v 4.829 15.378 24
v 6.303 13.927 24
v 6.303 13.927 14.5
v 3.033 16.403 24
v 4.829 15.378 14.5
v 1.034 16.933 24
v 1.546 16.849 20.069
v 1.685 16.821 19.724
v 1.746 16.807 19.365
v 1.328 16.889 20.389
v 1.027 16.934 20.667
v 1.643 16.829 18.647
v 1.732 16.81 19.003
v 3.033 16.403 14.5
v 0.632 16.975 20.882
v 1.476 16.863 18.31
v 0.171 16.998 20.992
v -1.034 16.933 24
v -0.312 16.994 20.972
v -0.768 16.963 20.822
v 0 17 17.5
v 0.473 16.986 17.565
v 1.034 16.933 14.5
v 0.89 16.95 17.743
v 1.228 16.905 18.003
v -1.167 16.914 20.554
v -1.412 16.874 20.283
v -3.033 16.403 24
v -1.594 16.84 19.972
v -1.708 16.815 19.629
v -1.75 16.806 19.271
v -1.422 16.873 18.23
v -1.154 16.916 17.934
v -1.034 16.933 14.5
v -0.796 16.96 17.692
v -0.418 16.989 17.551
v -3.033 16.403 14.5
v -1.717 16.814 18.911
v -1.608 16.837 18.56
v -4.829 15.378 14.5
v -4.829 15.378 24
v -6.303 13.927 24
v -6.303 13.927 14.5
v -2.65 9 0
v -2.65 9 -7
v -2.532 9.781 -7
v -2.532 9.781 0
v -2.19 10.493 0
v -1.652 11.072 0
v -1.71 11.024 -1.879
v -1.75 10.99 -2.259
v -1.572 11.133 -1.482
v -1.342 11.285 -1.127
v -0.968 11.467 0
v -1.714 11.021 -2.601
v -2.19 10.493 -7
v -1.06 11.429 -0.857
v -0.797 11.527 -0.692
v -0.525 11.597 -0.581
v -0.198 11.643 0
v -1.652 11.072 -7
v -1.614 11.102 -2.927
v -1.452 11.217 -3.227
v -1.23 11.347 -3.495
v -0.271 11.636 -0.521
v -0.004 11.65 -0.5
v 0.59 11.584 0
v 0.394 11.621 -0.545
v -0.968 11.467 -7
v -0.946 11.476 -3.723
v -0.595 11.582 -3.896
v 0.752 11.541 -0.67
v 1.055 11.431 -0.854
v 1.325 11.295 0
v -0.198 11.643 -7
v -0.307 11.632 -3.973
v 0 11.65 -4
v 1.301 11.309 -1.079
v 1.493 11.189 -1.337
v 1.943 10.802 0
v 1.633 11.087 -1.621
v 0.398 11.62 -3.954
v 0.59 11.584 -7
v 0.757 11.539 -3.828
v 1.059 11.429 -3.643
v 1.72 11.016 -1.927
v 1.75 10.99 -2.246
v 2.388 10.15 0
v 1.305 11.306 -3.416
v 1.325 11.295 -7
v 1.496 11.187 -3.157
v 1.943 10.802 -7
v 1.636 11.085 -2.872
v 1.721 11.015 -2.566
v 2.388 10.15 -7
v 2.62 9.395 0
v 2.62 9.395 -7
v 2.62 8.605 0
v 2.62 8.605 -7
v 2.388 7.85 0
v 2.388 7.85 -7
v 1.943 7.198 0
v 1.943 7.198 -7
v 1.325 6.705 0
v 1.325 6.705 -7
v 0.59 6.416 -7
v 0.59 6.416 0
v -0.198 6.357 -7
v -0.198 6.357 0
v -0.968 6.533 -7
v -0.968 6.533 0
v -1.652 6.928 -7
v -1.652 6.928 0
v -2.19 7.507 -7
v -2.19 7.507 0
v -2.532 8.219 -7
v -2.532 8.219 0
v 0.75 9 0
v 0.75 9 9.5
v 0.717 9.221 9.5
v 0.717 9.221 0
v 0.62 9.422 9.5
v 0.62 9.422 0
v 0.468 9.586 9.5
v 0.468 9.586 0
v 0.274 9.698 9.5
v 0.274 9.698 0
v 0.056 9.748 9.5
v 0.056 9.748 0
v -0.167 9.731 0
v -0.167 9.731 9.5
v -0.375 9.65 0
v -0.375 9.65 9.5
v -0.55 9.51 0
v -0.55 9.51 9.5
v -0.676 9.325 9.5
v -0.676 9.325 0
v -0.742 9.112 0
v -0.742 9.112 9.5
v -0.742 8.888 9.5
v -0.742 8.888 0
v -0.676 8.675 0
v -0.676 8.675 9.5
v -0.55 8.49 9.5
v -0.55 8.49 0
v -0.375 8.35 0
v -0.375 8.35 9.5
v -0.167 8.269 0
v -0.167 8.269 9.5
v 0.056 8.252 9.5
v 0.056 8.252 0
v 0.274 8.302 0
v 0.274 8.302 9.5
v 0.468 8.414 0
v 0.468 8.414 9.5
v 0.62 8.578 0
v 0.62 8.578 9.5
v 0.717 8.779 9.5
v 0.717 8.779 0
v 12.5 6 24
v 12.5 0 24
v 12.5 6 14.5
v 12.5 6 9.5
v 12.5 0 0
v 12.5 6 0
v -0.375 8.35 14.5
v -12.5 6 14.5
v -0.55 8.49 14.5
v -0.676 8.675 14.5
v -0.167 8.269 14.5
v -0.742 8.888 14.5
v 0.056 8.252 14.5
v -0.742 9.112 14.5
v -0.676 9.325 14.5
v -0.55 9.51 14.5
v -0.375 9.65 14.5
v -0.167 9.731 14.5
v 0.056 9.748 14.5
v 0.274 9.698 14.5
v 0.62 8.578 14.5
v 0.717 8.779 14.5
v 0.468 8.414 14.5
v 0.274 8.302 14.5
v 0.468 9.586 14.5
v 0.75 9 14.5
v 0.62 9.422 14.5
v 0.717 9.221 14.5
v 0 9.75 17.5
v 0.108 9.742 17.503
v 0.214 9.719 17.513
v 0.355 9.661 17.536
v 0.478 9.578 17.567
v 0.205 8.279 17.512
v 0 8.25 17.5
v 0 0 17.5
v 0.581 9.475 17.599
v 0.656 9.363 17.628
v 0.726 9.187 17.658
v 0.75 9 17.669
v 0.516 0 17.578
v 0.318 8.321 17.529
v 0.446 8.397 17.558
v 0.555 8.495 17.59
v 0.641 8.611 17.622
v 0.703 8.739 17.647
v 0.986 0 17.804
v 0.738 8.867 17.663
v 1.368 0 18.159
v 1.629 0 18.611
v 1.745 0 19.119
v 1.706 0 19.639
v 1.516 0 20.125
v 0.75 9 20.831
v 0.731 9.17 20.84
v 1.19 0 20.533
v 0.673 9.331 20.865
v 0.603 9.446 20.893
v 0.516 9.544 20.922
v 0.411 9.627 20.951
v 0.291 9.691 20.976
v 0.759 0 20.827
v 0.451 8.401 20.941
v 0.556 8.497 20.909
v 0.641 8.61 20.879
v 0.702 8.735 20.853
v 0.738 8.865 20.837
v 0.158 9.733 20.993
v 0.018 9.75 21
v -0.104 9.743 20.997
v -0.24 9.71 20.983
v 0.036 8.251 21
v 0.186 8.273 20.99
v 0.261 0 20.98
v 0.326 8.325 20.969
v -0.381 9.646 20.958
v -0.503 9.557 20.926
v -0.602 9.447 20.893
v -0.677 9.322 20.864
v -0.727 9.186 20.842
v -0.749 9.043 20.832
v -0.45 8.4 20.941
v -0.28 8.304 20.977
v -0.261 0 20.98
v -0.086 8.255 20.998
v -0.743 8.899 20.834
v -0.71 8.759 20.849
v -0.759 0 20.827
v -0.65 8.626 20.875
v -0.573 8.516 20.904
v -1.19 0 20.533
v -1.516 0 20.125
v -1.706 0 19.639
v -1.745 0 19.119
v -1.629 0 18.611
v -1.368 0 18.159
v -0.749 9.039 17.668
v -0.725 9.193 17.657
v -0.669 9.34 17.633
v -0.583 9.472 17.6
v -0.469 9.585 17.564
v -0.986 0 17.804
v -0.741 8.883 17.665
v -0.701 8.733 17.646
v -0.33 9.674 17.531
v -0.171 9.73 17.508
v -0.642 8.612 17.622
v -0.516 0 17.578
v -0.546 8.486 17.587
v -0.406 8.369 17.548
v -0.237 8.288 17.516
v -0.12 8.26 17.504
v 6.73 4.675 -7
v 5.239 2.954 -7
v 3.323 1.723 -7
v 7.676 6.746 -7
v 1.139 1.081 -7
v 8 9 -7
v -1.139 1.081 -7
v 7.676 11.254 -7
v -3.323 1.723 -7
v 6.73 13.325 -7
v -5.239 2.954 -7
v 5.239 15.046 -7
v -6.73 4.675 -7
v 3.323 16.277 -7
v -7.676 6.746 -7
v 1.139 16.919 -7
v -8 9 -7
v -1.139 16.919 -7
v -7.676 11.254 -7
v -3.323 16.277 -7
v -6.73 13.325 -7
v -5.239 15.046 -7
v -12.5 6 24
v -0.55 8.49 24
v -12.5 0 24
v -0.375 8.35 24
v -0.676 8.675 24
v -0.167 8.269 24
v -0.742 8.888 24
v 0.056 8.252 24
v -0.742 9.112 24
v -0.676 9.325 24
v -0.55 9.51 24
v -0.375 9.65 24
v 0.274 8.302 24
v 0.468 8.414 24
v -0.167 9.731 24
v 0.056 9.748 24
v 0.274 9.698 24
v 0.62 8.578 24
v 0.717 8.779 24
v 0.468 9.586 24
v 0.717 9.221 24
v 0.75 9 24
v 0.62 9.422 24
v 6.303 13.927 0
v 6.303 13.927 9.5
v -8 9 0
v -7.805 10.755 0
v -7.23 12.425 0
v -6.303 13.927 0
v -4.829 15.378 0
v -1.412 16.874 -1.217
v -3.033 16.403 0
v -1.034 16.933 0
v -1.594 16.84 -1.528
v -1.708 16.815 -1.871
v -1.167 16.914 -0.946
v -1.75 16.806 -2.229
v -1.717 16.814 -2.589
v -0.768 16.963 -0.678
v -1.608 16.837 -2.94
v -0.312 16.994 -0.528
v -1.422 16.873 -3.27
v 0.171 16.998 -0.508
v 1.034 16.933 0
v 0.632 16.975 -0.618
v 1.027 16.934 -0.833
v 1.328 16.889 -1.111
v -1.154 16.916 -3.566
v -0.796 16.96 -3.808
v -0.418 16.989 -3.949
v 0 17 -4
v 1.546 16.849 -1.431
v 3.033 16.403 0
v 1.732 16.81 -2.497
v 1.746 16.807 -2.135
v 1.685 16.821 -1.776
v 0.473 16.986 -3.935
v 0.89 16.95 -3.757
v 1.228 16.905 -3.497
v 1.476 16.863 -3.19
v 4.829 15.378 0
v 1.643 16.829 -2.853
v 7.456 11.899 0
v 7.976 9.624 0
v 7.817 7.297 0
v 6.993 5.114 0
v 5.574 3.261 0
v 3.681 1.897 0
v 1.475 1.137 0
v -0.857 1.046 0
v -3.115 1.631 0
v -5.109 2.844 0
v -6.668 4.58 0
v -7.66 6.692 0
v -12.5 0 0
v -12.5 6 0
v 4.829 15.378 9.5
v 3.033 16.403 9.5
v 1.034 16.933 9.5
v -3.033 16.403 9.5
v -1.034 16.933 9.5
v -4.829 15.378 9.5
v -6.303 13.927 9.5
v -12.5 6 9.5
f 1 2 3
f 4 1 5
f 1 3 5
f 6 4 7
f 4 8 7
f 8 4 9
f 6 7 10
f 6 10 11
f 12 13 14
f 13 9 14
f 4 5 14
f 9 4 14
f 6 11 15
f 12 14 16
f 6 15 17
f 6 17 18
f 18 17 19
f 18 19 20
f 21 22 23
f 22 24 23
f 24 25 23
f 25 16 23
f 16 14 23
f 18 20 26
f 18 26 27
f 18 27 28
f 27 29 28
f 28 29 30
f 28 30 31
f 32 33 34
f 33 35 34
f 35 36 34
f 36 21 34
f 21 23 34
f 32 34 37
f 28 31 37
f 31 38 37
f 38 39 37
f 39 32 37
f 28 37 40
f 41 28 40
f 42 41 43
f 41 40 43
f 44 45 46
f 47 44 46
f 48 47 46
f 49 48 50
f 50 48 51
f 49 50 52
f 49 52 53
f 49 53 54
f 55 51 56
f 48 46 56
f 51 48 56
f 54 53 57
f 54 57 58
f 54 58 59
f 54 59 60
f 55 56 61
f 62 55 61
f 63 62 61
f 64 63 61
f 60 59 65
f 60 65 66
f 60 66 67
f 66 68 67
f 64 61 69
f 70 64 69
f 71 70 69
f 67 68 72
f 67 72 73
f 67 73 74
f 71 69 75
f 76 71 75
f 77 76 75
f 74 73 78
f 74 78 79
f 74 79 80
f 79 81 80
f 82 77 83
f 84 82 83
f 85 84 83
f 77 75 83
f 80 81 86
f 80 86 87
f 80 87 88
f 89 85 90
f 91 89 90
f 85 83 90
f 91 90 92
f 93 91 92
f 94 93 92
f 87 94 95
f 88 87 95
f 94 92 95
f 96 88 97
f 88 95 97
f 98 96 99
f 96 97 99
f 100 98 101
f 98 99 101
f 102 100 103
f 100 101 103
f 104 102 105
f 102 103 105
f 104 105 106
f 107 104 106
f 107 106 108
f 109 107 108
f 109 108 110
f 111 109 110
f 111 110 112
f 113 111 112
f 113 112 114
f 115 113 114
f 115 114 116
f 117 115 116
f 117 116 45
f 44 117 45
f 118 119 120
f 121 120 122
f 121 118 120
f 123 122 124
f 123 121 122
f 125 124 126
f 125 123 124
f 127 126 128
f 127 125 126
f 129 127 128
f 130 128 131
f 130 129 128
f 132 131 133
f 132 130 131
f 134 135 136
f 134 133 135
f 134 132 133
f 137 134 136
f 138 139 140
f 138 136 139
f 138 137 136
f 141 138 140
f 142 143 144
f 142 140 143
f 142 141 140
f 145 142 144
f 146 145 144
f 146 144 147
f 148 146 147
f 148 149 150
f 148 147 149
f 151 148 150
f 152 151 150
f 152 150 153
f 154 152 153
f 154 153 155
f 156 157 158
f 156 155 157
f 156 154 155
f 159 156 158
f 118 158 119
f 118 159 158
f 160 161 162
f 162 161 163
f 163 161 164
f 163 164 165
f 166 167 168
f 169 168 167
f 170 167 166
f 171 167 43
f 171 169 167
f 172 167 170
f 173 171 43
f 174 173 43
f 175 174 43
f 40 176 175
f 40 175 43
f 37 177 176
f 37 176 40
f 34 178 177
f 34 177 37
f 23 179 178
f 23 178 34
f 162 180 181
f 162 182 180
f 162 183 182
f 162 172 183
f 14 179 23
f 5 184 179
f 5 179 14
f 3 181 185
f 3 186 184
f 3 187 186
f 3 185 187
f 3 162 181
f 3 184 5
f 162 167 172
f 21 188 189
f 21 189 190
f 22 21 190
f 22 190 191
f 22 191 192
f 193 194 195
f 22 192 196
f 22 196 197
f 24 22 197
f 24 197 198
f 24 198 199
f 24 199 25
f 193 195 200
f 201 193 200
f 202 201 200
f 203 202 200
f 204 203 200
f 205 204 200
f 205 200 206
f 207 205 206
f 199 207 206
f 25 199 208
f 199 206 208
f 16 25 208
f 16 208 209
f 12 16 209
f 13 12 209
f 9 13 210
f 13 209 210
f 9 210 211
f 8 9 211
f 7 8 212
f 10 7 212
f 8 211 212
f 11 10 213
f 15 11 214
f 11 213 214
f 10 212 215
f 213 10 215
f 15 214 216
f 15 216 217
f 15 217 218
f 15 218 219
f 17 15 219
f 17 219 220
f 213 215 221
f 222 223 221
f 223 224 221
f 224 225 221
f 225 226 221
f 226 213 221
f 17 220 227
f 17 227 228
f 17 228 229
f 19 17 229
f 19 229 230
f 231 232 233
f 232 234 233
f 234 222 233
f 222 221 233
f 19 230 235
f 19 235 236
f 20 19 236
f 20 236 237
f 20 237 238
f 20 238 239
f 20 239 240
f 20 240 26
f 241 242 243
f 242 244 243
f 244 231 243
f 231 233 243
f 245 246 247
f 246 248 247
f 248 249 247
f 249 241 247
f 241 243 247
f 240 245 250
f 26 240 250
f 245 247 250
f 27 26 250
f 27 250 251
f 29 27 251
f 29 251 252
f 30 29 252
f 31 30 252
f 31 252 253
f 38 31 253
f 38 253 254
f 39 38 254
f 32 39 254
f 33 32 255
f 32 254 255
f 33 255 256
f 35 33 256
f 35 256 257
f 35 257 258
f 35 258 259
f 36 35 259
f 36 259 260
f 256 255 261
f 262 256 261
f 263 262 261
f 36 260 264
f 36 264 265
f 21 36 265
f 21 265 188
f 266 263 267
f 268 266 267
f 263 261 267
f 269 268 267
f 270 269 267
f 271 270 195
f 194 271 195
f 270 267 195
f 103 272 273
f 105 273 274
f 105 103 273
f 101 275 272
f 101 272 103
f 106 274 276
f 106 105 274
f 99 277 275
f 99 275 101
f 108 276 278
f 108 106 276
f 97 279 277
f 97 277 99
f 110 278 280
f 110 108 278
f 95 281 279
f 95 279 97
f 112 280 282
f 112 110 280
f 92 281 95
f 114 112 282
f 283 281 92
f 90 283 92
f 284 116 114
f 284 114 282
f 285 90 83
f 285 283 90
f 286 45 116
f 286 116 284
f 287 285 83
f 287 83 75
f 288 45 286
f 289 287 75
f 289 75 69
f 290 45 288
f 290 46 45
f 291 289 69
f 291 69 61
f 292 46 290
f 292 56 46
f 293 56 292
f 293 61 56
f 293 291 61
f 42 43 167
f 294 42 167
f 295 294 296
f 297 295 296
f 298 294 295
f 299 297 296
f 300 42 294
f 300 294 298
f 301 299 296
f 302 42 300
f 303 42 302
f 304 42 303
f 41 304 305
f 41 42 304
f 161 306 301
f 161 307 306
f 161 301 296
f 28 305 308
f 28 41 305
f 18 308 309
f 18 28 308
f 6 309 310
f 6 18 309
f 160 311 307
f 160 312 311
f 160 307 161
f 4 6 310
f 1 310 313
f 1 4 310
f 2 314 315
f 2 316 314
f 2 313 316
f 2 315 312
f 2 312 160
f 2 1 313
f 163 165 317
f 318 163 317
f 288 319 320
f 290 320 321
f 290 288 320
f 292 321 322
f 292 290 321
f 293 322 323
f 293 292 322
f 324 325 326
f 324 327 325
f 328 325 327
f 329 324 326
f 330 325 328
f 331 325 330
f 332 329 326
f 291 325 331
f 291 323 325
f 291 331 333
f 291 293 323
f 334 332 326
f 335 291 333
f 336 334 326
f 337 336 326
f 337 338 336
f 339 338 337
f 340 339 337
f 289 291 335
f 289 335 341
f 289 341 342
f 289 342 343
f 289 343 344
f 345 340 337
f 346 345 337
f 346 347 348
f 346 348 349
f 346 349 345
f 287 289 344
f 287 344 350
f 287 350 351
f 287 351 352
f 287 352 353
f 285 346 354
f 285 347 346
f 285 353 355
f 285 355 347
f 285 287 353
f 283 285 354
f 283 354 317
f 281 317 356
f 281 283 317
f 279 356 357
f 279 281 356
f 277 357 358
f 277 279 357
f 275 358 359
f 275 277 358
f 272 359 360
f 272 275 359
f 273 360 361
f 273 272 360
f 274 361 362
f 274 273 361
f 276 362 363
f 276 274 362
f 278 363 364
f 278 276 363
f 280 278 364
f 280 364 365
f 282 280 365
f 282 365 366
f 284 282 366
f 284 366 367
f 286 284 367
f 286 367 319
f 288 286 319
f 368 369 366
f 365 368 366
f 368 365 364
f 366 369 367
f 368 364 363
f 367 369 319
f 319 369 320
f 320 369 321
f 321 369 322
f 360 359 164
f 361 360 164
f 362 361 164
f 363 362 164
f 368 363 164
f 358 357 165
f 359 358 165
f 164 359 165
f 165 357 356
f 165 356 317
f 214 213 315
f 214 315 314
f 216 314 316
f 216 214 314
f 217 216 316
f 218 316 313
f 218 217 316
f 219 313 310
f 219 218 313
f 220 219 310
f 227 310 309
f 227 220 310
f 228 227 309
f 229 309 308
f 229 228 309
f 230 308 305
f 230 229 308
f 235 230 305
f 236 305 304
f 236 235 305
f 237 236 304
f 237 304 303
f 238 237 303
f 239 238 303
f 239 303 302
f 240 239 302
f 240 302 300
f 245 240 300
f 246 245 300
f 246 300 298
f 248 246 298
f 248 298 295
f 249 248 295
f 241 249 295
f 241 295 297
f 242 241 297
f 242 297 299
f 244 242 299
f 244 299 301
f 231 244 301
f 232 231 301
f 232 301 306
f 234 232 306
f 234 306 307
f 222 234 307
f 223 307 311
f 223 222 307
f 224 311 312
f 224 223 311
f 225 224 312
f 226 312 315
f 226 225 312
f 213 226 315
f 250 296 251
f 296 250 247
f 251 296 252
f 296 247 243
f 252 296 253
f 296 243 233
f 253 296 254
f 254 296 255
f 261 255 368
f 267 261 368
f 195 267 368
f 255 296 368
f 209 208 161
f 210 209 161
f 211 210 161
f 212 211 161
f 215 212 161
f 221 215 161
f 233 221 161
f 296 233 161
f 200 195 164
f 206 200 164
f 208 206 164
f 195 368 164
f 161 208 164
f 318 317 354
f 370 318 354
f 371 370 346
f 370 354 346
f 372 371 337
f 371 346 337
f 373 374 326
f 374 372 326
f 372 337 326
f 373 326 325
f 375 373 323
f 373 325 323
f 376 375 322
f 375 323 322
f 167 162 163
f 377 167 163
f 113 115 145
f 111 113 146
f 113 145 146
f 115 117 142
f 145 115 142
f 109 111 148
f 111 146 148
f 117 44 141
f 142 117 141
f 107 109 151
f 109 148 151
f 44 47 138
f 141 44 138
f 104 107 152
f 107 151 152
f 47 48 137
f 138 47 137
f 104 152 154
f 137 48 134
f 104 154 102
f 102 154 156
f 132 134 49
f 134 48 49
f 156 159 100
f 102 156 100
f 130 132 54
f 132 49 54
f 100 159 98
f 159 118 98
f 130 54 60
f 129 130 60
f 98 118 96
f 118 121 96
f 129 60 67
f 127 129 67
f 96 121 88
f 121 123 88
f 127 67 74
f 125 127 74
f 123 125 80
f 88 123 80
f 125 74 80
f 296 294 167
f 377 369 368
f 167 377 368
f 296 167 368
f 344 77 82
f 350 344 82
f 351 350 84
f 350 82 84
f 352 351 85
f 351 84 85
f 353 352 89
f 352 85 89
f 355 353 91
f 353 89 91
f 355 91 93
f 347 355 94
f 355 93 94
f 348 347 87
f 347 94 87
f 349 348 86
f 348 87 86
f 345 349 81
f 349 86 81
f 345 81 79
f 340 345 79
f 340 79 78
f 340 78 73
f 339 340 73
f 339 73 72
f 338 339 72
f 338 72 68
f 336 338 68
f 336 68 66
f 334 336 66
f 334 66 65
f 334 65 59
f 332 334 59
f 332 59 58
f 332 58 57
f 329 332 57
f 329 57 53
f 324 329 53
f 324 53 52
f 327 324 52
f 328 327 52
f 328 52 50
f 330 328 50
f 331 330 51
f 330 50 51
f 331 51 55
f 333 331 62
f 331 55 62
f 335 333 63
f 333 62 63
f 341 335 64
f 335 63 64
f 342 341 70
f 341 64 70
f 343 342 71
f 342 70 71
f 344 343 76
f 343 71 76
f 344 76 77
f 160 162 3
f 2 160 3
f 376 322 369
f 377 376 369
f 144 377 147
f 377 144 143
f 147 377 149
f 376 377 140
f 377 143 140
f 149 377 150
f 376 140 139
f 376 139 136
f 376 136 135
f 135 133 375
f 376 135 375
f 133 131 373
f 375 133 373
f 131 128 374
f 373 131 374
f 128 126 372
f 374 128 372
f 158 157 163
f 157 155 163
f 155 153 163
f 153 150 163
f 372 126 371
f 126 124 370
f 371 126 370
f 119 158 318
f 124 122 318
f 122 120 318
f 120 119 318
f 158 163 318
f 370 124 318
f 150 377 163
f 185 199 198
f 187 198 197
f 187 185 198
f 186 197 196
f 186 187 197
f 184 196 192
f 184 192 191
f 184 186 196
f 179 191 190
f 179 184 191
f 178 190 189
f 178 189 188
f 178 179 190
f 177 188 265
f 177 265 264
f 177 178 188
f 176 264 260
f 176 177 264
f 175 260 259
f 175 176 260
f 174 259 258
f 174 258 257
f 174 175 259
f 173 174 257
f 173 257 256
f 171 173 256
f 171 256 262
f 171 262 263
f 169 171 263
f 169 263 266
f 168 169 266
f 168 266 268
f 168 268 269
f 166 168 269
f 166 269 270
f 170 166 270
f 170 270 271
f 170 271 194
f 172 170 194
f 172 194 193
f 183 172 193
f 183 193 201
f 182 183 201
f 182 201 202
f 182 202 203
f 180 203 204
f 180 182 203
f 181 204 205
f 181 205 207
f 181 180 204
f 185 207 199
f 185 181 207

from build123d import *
from build123d.topology import SkipClean

# Parameters (mm, degrees)
SKETCH1_R           = 0.75
BOSS_EXTRUDE1_DEPTH = 24
BOSS_EXTRUDE2_START = 7
SKETCH2_R           = 8
SKETCH2_R_2         = 2.65
BOSS_EXTRUDE2_DEPTH = 7
SKETCH4_W           = 5
SKETCH4_H           = 11
CUT_EXTRUDE1_DEPTH  = 39.600518131
SKETCH5_R           = 1.75
CUT_EXTRUDE2_DEPTH  = 32.957002363
SKETCH6_R           = 1.75
CUT_EXTRUDE3_DEPTH  = 29.517538579


with BuildPart() as part:
    # Sketch1 → Boss-Extrude1 (new body)
    with BuildSketch(Plane.XY):
        with BuildLine():
            Line((-12.5, 0), (12.5, 0))
            Line((12.5, 0), (12.5, 6))
            Line((12.5, 6), (6.302543671, 13.927265294))
            ThreePointArc((6.302543671, 13.927265294), (0, 17), (-6.302543671, 13.927265294))
            Line((-6.302543671, 13.927265294), (-12.5, 6))
            Line((-12.5, 6), (-12.5, 0))
        make_face()
        with Locations((0, 9)):
            Circle(SKETCH1_R, mode=Mode.SUBTRACT)
    extrude(amount=BOSS_EXTRUDE1_DEPTH)

    # Sketch2 → Boss-Extrude2 (add)
    with SkipClean():  # the faces are left unmerged after this step: merging them gives an invalid solid
        with BuildSketch(Plane(origin=(0, 0, 0), x_dir=(-1, 0, 0), z_dir=(0, 0, -1)).offset(BOSS_EXTRUDE2_START)):
            with Locations((0, 9)):
                Circle(SKETCH2_R)
            with Locations((0, 9)):
                Circle(SKETCH2_R_2, mode=Mode.SUBTRACT)
        extrude(amount=-BOSS_EXTRUDE2_DEPTH)

    # Sketch4 → Cut-Extrude1 (cut, through all)
    with BuildSketch(Plane(origin=(12.5, 0, 0), x_dir=(0, 0, -1), z_dir=(1, 0, 0))):
        with Locations((-12, 11.5)):
            Rectangle(SKETCH4_W, SKETCH4_H)
    extrude(amount=-CUT_EXTRUDE1_DEPTH, mode=Mode.SUBTRACT)

    # Sketch5 → Cut-Extrude2 (cut, through all)
    with SkipClean():  # the faces are left unmerged after this step: merging them gives an invalid solid
        with BuildSketch(Plane.XZ):
            with Locations(Location((0, 19.25, 0), (0, 0, 270))):
                Circle(SKETCH5_R)
        extrude(amount=-CUT_EXTRUDE2_DEPTH, mode=Mode.SUBTRACT)

    # Sketch6 → Cut-Extrude3 (cut, through all)
    with SkipClean():  # the faces are left unmerged after this step: merging them gives an invalid solid
        with BuildSketch(Plane(origin=(0, 9, 0), x_dir=(-1, 0, 0), z_dir=(0, -1, 0))):
            with Locations(Location((0, 2.25, 0), (0, 0, 90))):
                Circle(SKETCH6_R)
        extrude(amount=-CUT_EXTRUDE3_DEPTH, mode=Mode.SUBTRACT)


solid = part.part
